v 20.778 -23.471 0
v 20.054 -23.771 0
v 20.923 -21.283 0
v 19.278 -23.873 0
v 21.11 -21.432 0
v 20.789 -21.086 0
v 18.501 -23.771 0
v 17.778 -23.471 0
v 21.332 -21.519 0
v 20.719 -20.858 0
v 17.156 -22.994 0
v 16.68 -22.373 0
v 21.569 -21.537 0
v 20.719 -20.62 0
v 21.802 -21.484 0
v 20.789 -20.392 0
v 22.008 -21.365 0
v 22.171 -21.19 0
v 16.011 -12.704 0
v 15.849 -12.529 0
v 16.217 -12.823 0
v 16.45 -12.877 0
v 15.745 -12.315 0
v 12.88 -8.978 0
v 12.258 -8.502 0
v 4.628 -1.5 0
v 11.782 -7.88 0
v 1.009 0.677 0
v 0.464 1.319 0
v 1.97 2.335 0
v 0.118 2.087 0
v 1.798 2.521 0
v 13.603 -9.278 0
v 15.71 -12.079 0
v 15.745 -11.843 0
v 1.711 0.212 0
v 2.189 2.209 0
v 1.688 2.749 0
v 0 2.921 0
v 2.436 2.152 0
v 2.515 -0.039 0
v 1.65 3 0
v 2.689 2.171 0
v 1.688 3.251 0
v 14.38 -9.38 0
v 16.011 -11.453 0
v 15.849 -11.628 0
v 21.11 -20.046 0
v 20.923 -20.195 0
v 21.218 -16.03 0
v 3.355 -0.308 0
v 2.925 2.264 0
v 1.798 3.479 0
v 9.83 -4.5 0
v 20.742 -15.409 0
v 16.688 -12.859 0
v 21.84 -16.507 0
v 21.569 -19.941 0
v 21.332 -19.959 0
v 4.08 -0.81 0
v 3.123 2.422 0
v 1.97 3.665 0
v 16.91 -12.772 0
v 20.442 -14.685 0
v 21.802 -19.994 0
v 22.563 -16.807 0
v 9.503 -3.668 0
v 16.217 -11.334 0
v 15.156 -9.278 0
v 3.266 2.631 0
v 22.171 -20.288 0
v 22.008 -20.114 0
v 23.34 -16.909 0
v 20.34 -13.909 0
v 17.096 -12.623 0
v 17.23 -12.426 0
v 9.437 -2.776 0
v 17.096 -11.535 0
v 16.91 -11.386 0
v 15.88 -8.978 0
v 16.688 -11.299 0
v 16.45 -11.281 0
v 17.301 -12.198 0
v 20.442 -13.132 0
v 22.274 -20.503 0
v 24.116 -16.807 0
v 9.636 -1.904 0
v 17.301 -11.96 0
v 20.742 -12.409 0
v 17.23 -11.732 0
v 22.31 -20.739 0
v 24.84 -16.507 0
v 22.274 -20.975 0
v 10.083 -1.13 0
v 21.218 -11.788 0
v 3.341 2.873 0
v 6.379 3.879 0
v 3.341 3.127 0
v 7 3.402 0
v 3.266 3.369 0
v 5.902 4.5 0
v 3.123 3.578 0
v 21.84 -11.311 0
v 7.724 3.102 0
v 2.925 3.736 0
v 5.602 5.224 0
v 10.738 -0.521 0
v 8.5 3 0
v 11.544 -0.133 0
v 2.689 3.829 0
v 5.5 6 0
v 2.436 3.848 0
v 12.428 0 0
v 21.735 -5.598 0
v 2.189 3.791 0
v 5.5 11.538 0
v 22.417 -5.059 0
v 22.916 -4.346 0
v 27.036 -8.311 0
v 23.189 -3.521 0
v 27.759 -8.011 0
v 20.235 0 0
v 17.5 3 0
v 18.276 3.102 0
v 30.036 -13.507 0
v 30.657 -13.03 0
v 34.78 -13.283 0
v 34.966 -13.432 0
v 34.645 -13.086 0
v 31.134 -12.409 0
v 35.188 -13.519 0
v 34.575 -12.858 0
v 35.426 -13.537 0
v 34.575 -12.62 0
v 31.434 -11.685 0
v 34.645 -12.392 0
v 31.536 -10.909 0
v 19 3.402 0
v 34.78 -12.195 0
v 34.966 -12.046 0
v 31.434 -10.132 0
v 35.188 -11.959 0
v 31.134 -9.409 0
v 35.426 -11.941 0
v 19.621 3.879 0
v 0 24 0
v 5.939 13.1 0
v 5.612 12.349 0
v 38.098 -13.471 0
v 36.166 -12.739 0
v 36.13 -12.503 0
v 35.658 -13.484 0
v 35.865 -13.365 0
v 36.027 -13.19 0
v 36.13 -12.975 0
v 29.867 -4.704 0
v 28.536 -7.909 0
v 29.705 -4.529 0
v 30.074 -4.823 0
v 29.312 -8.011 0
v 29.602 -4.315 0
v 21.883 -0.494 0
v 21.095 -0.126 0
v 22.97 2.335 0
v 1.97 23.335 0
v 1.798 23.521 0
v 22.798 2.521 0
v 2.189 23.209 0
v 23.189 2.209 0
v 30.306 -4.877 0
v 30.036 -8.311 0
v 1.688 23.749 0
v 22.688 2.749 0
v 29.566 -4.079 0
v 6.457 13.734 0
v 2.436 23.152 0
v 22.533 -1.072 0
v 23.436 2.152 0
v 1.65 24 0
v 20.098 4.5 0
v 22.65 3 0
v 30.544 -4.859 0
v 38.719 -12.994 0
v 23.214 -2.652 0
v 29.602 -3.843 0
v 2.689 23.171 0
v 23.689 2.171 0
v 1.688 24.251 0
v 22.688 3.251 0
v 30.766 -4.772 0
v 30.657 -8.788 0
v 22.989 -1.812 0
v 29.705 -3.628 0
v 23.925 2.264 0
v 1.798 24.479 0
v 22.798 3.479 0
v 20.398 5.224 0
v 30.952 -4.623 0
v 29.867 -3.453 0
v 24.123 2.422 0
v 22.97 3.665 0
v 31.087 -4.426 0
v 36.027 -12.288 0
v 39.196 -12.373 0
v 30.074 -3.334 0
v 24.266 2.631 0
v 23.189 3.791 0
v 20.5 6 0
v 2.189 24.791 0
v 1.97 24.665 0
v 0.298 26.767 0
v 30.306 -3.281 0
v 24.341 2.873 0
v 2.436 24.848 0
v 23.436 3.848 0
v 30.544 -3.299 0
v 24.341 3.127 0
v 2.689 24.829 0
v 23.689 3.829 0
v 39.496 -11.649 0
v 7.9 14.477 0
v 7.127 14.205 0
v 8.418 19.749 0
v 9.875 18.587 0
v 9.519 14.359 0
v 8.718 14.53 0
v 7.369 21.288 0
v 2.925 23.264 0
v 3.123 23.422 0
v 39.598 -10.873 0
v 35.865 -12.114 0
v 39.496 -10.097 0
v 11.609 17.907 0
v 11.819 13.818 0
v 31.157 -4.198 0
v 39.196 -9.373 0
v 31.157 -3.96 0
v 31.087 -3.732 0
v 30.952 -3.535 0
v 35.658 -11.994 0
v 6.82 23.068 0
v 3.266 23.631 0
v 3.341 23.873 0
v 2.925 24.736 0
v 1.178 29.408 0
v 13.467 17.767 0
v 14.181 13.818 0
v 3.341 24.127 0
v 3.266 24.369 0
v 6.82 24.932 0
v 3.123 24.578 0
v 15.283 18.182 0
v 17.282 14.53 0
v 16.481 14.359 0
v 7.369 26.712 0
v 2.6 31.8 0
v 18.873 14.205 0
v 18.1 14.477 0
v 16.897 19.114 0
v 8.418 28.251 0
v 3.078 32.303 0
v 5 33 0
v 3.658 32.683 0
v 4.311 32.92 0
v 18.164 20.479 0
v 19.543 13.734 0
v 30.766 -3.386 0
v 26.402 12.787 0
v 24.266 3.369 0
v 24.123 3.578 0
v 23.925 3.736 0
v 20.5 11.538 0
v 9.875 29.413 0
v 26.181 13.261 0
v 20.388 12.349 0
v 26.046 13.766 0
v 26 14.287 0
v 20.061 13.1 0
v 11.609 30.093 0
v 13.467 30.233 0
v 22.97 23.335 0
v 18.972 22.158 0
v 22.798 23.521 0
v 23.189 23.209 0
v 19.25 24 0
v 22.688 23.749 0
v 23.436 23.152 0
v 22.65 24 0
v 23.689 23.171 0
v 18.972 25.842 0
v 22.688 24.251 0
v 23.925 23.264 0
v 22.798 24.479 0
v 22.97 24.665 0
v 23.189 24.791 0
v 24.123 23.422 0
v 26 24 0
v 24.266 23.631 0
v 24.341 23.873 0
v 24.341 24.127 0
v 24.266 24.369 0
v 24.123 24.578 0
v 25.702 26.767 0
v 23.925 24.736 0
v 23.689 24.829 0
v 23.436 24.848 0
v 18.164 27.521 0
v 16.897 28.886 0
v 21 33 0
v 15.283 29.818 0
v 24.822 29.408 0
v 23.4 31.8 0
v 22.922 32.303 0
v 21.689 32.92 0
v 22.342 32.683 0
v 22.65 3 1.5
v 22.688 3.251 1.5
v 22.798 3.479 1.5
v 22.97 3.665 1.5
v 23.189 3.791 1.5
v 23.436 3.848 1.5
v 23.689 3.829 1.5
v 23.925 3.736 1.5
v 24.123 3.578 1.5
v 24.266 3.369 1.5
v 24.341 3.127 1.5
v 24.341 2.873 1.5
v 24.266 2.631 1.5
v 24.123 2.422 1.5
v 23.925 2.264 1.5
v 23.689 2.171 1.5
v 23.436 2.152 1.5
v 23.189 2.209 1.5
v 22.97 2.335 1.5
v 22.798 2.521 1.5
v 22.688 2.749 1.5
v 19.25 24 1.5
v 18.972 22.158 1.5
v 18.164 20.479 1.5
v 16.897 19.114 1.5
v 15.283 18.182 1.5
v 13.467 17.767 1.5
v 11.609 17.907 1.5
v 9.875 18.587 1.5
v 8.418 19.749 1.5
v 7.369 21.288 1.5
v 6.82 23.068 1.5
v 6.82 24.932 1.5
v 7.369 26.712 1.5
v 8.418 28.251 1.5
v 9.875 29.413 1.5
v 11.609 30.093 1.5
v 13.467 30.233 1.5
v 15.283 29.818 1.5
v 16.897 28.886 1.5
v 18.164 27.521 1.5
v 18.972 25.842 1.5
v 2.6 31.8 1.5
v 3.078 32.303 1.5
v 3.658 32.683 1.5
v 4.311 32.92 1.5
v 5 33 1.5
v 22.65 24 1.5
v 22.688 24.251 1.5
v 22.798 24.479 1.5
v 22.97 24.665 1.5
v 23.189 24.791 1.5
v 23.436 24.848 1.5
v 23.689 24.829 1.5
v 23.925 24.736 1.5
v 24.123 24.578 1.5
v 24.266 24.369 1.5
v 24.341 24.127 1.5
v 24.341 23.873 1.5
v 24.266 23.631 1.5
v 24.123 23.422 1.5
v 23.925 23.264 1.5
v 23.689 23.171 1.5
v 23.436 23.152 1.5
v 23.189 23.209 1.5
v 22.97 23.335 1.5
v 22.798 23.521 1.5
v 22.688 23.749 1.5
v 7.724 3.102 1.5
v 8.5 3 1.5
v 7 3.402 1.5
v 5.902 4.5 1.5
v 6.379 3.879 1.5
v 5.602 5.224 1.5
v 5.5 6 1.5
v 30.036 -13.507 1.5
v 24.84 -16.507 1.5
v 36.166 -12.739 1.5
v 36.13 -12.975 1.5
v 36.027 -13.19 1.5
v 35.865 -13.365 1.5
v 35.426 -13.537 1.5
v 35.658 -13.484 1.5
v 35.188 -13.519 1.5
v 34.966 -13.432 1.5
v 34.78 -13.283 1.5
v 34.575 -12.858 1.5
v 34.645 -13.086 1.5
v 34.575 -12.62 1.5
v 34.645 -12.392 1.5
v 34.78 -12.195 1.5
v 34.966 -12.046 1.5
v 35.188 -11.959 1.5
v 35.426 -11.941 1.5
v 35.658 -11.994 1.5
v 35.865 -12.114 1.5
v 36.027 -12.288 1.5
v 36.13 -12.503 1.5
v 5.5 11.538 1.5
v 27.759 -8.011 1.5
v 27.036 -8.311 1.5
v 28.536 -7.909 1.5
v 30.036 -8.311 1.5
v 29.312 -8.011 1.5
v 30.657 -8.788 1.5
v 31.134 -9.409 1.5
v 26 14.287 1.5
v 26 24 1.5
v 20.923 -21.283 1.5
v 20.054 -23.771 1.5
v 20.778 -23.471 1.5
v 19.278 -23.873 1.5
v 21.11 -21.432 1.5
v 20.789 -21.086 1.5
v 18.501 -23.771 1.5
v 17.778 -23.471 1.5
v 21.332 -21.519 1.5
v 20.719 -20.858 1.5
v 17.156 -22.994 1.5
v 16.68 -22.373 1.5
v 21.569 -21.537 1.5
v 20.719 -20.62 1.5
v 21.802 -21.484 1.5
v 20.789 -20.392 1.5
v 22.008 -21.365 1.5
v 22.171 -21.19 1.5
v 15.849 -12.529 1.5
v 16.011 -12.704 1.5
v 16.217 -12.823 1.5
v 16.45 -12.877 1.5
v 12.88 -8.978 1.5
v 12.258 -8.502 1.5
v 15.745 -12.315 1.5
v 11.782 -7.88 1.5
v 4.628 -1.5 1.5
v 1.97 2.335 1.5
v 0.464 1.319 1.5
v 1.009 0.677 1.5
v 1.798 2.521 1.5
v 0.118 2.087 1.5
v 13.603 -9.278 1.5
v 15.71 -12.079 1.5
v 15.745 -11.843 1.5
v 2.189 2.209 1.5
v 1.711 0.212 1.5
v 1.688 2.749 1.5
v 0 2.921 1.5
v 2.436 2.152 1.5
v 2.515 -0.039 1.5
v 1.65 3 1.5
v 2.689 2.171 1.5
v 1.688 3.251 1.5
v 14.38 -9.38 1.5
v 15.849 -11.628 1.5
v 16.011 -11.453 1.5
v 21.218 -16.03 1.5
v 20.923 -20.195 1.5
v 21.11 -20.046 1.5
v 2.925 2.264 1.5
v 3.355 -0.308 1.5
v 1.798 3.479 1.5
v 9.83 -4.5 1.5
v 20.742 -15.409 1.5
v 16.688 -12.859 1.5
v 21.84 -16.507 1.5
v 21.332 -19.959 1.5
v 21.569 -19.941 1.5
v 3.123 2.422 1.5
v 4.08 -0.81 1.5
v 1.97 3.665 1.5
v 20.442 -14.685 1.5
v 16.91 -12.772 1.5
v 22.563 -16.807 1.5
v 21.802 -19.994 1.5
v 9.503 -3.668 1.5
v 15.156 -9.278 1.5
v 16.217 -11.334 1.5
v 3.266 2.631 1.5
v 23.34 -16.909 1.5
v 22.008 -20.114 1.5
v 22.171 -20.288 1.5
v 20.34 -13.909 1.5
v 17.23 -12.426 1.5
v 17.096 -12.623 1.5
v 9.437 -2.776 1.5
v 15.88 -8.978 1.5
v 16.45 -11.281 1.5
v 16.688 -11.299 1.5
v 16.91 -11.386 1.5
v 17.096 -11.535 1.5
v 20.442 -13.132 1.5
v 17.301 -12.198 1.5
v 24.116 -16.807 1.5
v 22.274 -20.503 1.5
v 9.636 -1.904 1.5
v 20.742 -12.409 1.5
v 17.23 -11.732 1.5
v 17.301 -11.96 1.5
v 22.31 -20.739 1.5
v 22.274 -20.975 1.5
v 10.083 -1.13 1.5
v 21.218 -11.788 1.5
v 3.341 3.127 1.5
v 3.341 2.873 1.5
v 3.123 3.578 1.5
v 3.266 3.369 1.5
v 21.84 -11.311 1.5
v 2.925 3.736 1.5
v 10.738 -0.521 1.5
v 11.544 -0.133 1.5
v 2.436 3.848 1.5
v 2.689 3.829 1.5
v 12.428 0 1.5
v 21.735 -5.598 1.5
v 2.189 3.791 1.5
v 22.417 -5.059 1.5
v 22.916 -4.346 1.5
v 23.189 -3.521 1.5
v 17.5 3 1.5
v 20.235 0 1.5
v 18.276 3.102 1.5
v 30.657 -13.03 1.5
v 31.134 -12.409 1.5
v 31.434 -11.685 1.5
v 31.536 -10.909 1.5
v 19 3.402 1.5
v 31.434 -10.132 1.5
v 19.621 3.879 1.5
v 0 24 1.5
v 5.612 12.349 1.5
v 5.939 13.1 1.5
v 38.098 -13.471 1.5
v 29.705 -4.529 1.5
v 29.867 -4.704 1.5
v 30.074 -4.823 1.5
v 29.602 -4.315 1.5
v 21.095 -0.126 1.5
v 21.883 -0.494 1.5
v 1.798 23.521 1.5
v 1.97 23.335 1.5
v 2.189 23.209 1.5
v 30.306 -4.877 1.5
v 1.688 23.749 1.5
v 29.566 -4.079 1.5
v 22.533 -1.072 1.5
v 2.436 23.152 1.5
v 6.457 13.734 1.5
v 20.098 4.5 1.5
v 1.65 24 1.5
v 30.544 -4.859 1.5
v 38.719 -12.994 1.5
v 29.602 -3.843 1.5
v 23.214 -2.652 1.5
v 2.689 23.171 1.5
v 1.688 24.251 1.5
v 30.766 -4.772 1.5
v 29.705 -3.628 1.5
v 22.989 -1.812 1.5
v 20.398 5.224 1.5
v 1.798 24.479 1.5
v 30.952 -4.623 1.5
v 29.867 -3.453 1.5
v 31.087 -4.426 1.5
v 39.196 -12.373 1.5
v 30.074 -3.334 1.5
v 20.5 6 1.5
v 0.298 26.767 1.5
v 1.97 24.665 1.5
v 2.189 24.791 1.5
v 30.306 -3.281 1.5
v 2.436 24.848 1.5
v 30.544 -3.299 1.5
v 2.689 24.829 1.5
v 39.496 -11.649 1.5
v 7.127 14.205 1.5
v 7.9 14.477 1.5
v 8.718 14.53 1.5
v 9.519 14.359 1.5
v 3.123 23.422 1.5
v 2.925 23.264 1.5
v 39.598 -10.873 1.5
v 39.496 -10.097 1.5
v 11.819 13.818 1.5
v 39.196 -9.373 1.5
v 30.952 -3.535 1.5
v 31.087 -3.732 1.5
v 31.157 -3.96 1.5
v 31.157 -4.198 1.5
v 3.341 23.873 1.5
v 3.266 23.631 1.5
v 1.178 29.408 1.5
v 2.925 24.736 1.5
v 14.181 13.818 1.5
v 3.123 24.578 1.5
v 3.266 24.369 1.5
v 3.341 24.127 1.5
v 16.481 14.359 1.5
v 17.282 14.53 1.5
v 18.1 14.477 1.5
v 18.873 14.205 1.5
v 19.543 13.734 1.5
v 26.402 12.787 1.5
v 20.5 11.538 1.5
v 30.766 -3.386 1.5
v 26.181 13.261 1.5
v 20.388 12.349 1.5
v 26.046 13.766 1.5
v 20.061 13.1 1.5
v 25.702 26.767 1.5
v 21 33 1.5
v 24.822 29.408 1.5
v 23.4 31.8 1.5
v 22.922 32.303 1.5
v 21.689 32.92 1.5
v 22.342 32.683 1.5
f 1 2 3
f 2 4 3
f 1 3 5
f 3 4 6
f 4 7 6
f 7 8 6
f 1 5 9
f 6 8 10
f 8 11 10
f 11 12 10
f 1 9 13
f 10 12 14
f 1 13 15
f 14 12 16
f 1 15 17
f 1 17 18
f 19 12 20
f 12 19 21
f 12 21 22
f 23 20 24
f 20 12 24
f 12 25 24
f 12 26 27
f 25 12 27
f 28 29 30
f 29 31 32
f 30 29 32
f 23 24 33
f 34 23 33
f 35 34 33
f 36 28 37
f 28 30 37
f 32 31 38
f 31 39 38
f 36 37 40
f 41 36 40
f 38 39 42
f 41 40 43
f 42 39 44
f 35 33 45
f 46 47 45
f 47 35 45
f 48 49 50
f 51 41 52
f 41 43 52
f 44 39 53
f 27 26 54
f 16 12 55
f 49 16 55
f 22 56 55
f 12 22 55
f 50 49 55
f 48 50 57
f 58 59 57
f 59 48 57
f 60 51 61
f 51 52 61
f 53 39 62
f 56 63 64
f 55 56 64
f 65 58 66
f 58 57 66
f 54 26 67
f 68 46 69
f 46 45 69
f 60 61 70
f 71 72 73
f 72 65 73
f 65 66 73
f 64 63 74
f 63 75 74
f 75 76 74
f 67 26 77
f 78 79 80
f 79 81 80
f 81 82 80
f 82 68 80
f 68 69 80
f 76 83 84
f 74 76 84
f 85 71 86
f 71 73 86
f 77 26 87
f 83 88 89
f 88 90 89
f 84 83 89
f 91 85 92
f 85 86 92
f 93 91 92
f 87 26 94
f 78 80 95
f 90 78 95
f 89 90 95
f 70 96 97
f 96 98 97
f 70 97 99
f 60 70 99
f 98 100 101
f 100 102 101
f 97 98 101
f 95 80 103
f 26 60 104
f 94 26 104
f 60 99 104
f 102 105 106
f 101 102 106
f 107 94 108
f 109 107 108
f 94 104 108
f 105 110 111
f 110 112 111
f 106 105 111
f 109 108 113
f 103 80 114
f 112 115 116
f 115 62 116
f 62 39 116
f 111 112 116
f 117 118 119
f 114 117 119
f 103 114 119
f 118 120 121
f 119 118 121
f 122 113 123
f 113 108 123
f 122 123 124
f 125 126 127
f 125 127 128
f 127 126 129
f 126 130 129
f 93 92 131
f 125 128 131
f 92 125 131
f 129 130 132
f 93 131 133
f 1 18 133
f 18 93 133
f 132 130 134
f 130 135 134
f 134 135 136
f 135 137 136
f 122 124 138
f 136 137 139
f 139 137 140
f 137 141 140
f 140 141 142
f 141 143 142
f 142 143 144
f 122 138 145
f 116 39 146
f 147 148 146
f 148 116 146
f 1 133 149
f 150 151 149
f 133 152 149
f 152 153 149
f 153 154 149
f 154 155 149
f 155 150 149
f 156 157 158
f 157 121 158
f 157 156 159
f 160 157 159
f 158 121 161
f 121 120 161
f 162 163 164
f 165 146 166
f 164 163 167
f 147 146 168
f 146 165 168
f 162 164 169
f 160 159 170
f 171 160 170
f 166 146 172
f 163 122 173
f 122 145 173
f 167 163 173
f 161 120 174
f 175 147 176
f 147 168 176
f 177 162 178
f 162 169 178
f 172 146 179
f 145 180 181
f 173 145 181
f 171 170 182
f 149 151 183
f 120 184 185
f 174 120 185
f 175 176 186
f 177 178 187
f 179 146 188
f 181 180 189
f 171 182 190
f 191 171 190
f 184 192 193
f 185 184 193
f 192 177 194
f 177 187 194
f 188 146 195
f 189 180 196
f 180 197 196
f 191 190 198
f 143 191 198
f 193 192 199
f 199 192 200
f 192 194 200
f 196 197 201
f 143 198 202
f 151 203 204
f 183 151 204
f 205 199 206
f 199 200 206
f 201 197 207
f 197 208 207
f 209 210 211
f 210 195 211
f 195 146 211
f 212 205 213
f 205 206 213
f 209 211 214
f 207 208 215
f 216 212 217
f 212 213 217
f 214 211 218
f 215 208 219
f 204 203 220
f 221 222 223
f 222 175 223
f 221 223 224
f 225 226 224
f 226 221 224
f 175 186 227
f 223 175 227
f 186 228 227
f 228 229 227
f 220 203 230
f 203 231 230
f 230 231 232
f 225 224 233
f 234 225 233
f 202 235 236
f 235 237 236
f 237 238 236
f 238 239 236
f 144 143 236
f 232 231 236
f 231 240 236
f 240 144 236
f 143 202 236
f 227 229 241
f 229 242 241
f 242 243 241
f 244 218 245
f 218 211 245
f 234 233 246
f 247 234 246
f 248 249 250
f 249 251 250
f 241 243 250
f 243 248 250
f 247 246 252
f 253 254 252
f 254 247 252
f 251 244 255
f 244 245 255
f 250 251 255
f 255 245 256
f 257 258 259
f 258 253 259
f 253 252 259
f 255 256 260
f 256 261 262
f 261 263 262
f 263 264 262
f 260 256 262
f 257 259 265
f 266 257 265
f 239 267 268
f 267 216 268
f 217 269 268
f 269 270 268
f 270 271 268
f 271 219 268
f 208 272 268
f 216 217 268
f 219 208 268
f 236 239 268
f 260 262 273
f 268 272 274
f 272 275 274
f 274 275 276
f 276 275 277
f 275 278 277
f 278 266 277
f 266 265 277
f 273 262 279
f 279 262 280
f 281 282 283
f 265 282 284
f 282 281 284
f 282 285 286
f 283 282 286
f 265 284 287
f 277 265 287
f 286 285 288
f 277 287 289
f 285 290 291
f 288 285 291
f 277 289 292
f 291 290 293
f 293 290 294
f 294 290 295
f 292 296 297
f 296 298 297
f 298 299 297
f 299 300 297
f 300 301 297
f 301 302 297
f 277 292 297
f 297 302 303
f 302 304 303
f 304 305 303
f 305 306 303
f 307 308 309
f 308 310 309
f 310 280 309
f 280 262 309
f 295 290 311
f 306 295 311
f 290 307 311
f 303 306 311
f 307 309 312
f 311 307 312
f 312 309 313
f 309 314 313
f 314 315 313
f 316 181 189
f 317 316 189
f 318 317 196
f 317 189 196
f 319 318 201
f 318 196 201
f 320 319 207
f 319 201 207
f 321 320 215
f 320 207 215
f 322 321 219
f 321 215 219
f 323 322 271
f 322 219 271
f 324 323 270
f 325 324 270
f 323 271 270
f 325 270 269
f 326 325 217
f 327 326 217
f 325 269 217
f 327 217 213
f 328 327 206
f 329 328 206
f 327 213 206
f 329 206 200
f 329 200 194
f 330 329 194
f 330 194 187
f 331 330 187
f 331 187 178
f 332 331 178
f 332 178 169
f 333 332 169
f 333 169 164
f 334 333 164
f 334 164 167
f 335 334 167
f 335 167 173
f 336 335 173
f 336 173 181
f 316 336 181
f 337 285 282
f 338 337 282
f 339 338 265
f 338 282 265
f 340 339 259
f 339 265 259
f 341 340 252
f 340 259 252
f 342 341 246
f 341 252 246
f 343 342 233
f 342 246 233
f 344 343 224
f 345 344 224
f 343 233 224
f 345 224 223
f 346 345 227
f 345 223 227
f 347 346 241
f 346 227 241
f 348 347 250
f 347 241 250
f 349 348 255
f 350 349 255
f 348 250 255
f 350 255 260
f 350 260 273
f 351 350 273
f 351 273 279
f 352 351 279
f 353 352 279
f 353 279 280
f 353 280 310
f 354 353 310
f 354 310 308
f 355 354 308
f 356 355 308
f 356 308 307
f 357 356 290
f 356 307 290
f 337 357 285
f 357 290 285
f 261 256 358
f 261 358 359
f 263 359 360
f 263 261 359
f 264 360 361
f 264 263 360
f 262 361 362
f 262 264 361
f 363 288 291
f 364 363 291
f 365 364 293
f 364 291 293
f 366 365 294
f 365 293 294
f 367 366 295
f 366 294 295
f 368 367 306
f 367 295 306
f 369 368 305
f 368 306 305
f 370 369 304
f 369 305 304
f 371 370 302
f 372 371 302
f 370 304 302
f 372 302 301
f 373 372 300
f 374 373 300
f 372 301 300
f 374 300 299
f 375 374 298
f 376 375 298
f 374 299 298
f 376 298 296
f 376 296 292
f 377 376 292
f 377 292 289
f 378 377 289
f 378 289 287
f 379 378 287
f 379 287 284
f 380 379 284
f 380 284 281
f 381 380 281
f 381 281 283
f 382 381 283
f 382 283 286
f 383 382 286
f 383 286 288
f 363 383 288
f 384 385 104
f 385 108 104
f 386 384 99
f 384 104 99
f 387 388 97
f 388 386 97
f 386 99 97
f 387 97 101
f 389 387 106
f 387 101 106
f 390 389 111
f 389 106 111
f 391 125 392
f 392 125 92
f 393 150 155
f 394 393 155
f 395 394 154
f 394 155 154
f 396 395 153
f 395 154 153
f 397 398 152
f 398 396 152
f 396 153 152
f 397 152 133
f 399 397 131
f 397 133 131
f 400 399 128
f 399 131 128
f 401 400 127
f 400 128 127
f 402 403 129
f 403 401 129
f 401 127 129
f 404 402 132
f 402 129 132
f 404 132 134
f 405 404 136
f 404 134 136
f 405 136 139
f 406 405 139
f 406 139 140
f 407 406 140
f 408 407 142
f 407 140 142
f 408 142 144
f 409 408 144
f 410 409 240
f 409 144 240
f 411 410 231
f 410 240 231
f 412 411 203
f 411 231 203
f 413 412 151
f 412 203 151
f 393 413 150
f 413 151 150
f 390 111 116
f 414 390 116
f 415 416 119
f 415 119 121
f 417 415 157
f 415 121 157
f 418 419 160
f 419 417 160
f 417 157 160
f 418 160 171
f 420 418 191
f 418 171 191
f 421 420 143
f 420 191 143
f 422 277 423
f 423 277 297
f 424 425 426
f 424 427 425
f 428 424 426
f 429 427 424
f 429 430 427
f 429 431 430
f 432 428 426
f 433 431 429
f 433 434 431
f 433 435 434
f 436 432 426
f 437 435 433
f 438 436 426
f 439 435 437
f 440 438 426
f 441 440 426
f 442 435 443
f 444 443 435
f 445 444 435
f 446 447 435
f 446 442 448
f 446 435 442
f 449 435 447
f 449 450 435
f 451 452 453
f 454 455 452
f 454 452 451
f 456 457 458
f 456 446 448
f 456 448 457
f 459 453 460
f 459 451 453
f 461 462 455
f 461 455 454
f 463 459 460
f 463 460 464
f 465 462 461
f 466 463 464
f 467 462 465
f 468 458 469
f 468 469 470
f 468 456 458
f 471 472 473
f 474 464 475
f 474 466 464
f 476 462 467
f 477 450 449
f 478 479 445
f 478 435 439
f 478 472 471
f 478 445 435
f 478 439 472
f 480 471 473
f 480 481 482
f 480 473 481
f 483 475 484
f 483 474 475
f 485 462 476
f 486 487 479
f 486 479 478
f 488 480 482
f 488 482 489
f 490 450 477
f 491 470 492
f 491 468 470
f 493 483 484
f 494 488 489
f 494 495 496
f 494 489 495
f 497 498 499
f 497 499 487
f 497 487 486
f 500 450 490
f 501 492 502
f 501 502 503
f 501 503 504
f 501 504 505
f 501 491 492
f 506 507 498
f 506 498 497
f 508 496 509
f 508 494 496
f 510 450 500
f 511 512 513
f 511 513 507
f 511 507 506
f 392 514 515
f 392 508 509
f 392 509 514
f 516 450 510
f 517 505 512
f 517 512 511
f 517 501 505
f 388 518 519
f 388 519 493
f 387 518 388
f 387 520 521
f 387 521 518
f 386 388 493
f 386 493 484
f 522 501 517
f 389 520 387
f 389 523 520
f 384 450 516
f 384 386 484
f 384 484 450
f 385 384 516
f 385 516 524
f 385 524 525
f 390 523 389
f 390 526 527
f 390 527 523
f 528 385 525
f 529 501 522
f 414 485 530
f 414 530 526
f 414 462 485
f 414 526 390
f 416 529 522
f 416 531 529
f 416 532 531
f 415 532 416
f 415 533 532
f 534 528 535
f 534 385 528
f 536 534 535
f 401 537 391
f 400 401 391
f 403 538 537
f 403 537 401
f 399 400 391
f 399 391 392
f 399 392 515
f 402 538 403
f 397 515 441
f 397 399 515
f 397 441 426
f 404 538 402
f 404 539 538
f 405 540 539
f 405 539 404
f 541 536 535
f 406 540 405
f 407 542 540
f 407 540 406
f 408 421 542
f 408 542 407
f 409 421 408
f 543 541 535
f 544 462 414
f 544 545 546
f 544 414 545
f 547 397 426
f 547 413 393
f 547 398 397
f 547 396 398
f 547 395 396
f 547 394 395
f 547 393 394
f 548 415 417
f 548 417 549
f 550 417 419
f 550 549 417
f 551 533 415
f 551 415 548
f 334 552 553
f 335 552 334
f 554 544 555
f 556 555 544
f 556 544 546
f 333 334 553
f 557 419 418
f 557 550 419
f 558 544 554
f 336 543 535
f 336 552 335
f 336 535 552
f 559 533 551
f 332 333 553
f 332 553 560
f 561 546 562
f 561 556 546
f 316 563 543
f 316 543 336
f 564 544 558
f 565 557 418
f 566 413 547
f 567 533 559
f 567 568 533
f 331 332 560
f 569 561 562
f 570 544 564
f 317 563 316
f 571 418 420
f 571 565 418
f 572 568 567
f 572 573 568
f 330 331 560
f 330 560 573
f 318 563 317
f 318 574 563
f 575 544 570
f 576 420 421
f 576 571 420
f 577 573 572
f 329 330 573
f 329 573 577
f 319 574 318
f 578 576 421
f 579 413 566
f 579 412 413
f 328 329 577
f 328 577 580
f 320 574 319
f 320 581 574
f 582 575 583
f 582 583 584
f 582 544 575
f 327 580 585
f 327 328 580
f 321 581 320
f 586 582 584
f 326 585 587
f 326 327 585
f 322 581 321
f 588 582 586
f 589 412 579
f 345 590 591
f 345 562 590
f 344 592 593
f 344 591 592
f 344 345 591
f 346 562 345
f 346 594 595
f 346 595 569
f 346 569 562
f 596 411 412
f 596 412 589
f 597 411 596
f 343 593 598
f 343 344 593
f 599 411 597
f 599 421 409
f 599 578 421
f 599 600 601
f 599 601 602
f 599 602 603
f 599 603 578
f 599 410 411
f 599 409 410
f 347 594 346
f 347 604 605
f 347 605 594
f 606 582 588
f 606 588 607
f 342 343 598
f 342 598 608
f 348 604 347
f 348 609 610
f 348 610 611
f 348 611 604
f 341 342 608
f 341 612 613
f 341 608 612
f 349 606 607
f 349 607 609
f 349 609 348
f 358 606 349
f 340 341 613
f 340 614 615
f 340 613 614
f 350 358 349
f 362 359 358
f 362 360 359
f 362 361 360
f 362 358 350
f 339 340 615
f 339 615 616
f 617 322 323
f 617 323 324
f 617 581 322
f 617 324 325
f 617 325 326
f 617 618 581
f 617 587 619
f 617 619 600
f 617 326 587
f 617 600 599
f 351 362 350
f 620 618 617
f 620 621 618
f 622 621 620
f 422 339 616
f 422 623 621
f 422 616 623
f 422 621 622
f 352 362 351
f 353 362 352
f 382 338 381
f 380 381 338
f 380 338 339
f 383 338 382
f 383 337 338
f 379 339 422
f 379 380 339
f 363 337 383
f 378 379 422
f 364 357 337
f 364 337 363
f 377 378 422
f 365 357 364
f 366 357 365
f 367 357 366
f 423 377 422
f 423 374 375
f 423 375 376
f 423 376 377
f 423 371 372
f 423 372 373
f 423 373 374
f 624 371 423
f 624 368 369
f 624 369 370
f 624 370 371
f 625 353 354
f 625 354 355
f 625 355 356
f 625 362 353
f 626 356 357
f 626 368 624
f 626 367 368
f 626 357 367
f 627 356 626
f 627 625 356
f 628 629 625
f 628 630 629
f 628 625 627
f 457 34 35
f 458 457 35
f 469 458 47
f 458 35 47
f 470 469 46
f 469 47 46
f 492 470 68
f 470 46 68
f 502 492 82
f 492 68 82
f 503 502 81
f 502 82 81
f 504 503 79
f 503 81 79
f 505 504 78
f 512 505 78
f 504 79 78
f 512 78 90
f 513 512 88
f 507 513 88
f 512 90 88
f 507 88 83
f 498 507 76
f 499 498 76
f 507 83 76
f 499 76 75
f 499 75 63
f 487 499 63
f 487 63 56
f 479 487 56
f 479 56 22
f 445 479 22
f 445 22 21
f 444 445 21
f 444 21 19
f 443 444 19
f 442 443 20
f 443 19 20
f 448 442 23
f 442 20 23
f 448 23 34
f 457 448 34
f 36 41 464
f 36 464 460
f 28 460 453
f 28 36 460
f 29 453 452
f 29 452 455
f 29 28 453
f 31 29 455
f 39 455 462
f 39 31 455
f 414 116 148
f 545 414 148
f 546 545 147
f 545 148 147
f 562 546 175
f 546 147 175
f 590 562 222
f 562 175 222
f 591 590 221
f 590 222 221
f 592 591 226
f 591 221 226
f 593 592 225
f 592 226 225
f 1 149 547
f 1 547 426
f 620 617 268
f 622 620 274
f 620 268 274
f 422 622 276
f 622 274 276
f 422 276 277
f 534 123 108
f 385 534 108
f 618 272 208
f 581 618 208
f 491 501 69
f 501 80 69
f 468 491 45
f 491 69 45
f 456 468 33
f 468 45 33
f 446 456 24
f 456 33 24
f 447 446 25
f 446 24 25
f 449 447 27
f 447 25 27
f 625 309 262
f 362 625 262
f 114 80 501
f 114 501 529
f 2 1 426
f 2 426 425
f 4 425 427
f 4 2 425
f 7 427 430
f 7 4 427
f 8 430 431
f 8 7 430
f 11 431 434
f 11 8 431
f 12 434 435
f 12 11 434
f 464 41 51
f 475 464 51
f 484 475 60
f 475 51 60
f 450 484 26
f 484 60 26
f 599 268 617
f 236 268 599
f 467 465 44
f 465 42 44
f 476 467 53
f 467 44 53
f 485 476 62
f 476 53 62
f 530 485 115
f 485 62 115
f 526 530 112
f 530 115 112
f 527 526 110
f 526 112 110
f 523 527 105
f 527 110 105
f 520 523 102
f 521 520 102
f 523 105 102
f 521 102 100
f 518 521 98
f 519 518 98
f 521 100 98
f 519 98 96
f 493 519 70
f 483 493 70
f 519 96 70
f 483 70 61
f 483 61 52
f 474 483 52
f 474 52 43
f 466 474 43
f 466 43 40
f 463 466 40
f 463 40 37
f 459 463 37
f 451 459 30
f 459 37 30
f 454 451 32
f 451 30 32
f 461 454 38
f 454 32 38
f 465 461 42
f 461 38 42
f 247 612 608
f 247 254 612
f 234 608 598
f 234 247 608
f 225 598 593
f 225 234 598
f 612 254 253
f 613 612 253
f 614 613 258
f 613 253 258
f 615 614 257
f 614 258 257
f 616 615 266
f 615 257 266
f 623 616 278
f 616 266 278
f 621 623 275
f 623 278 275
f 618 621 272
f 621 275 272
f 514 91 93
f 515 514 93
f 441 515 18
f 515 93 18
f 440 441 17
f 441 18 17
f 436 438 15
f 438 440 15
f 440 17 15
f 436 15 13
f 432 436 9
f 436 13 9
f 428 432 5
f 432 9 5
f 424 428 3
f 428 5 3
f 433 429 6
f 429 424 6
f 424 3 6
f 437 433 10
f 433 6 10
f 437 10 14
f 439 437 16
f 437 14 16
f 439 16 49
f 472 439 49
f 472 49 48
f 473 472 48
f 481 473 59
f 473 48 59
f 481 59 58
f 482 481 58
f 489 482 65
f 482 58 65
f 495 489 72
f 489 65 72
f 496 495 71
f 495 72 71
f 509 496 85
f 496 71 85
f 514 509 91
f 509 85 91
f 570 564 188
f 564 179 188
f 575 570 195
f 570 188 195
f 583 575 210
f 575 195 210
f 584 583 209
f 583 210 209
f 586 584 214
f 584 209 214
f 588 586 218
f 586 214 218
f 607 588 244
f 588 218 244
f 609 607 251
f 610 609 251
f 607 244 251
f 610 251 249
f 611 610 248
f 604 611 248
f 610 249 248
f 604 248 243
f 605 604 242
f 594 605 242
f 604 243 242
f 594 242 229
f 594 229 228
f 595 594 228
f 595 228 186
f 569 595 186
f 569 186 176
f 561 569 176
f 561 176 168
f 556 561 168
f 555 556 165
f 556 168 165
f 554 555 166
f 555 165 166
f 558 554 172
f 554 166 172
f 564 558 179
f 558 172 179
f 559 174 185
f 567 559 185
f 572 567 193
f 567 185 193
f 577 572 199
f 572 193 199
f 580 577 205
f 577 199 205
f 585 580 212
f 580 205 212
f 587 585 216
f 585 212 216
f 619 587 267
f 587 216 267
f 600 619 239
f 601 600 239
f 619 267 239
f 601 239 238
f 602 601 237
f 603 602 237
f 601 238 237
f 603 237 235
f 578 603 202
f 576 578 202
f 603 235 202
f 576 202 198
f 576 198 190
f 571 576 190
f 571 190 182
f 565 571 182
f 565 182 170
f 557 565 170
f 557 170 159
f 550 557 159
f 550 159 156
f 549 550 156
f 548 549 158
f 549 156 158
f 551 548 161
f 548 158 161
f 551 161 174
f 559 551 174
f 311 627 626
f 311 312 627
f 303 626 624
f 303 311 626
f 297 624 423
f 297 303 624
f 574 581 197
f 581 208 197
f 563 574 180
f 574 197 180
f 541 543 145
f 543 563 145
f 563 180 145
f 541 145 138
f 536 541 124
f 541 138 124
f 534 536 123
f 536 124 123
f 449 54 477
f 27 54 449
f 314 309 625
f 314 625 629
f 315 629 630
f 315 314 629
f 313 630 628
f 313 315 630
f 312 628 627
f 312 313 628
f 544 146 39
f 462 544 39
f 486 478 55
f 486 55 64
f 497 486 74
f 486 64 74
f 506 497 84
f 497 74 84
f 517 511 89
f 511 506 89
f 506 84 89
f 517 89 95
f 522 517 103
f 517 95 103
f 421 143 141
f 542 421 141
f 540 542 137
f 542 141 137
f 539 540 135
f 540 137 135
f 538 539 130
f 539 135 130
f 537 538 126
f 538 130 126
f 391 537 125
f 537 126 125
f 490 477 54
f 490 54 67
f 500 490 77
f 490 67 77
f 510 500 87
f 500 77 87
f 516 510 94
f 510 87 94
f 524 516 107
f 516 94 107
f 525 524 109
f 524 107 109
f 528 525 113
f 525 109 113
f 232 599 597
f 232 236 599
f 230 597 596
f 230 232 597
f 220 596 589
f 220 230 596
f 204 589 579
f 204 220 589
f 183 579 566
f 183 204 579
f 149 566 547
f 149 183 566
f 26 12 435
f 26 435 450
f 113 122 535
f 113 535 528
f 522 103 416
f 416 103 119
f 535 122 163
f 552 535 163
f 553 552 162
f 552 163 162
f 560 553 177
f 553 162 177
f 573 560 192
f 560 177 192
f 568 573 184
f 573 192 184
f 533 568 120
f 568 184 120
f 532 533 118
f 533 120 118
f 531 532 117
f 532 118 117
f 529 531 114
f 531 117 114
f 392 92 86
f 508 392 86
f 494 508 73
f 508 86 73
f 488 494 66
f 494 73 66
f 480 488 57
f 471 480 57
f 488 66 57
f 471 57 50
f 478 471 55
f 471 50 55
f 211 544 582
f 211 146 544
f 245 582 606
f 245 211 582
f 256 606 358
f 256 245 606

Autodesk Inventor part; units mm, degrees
ref_plane "YZ Plane" through (0, 0, 0) normal (1, 0, 0) x (0, 1, 0)
ref_plane "XZ Plane" through (0, 0, 0) normal (0, 1, 0) x (-1, 0, 0)
ref_plane "XY Plane" through (0, 0, 0) normal (0, 0, 1) x (1, 0, 0)
sketch "スケッチ2" plane through (0, 0, 0) normal (0, 0, 1) x (1, 0, 0)
  line L0 (0, 0) -> (26, 0)
  line L1 (26, 0) -> (26, 33)
  line L2 (26, 33) -> (0, 33)
  line L3 (0, 33) -> (0, 0)
  line L4 (0, 0) -> (26, 0)
  line L5 (26, 0) -> (26, 24)
  line L6 (26, 24) -> (0, 24) construction
  line L7 (0, 24) -> (0, 0)
  circle A0 centre (13, 24) radius 13
  circle A1 centre (13, 24) radius 6.25
  line L8 (26, 0) -> (0, 0)
  line L9 (17.9352, 27.452) -> (40.6962, -11.9711)
  line L10 (40.6962, -11.9711) -> (18.1795, -24.9711)
  line L11 (18.1795, -24.9711) -> (-4.3205, 14)
  circle A2 centre (21.5096, -20.7391) radius 0.8
  circle A3 centre (35.366, -12.7391) radius 0.8
  line L12 (-4.3205, 14) -> (18.1962, 27)
  point P0 (22.3808, 33)
  point P1 (3.6192, 33)
  point P2 (26, 13.4833)
  point P3 (3.7624, 0)
  point P4 (23.9624, 17.0125)
  point P5 (1.7417, 17.5)
  point P6 (0, 16.4944)
  point P7 (0, 6.5167)
  point P8 (7.5873, 20.875)
  point P9 (19.0712, 25.4845)
  dimension "d0" = 26
  dimension "d1" = 33
  dimension "d2" = 24
  dimension "d3" = 12.5
  dimension "d14" = 26
  dimension "d17" = 1.6
  dimension "d18" = 1.6
  dimension "d19" = 2
  dimension "d20" = 2
  dimension "d21" = 5
  dimension "d22" = 5
  dimension "d23" = 20
  dimension "d25" = 45
  dimension "d26" = 30
extrude "押し出し1" add sketch "スケッチ2" along normal blind 1.5 contours L3 L11 L0 | L11 L3 L12 A0 L9 L1 L0 | L0 L1 L9 L10 L11 | L3 A0 L12 | L9 A0 L1 | A0 L2 L9 A1 L12 | L12 A1 L9 A0
sketch "スケッチ3" plane through (0, 0, 0) normal (0, 0, -1) x (-1, 0, 0)
  circle A0 centre (-2.5, 24) radius 0.85 projected
  circle A1 centre (-23.5, 24) radius 0.85 projected
  circle A2 centre (-23.5, 3) radius 0.85 projected
  circle A3 centre (-2.5, 3) radius 0.85 projected
  circle A4 centre (-30.366, -4.0788) radius 0.8 projected
  circle A5 centre (-16.5096, -12.0788) radius 0.8 projected
  circle A6 centre (-13, 24) radius 6.25 projected
  line L0 (-2.5, 24) -> (-23.5, 24)
  line L1 (-23.5, 24) -> (-23.5, 3)
  line L2 (-23.5, 3) -> (-2.5, 3)
  line L3 (-2.5, 3) -> (-2.5, 24)
  circle A7 centre (-13, 24) radius 10.25
  line L4 (-5.5, 24) -> (-20.5, 24)
  line L5 (-20.5, 24) -> (-20.5, 3)
  line L6 (-20.5, 3) -> (-5.5, 3)
  line L7 (-5.5, 3) -> (-5.5, 24)
  line L8 (-3.7624, 0) -> (-18.1795, -24.9711) projected
  line L9 (0, 24) -> (0, 0) projected
  arc A8 (0, 24) -> (-3.6192, 33) centre (-13, 24) ccw projected
  line L10 (-22.3808, 33) -> (-3.6192, 33) projected
  arc A9 (-22.3808, 33) -> (-26, 24) centre (-13, 24) ccw projected
  line L11 (-26, 13.4833) -> (-26, 24) projected
  line L12 (-40.6962, -11.9711) -> (-26, 13.4833) projected
  line L13 (-18.1795, -24.9711) -> (-40.6962, -11.9711) projected
  line L14 (-3.7624, 0) -> (-18.1795, -24.9711) projected
  line L15 (0, 0) -> (-3.7624, 0) projected
  circle A10 centre (-13, 24) radius 6.25 projected
  circle A11 centre (-21.5096, -20.7391) radius 0.8 projected
  circle A12 centre (-35.366, -12.7391) radius 0.8 projected
  line L16 (-21.5096, -20.7391) -> (-16.5096, -12.0788)
  line L17 (-16.5096, -12.0788) -> (-30.366, -4.0788)
  line L18 (-30.366, -4.0788) -> (-35.366, -12.7391)
  line L19 (-35.366, -12.7391) -> (-21.5096, -20.7391)
  line L20 (-22.2417, -18.007) -> (-19.2417, -12.8109)
  line L21 (-19.2417, -12.8109) -> (-29.634, -6.8109)
  line L22 (-29.634, -6.8109) -> (-32.634, -12.007)
  line L23 (-32.634, -12.007) -> (-22.2417, -18.007)
  line L24 (-13.2817, -10.4784) -> (-24.5317, -3.9832)
  line L25 (-24.5317, -3.9832) -> (-16.75, 9.4952)
  line L26 (-16.75, 9.4952) -> (-5.5, 3)
  line L27 (-5.5, 3) -> (-13.2817, -10.4784)
  line L28 (-24.5317, -3.9832) -> (-28.866, -1.4808)
  line L29 (-28.866, -1.4808) -> (-28.0111, 0)
  line L30 (-28.0111, 0) -> (-22.2321, 0)
  line L31 (-22.2321, 0) -> (-7.2321, 0)
  point P0 (-5.5, 17.0134)
  point P1 (-20.5, 17.0134)
  dimension "d27" = 4
  dimension "d28" = 3
  dimension "d29" = 3
  dimension "d31" = 2
  dimension "d32" = 2
  dimension "d33" = 2
  dimension "d34" = 2
  dimension "d35" = 3
  dimension "d36" = 3
extrude "押し出し2" cut sketch "スケッチ3" against normal through all contours A0 L3 L0 A7 | A7 L0 A0 | A0 A7 L0 L3 | L0 A7 A0 | L3 L2 A3 | A3 L2 L3 | L7 L26 L25 L5 A7 | A7 L0 L1 A1 | A1 L0 A7 | L2 L25 L26 | A1 A7 L0 | L1 L0 A7 A1 | L27 L24 L25 L31 | L1 L2 A2 | A2 L2 L1 | L25 L28 L29 L30 | A4 L17 L18 | L18 L17 A4 | L17 L16 A5 | A5 L16 L17 | L23 L22 L21 L20
fillet "フィレット1" radius 3 19 edges at (20.5, 3, 0.75) (5.5, 3, 0.75) (20.5, 17.0134, 0.75) (5.5, 17.0134, 0.75) (7.2321, 0, 0.75) (13.2817, -10.4784, 0.75) (28.0111, 0, 0.75) (28.866, -1.4808, 0.75) (29.634, -6.8109, 0.75) (32.634, -12.007, 0.75) (22.2417, -18.007, 0.75) (19.2417, -12.8109, 0.75) (40.6962, -11.9711, 0.75) (18.1795, -24.9711, 0.75) (3.7624, 0, 0.75) (0, 0, 0.75) (26, 13.4833, 0.75) (22.3808, 33, 0.75) (3.6192, 33, 0.75)
equation "\"d20\" = d19"
properties part number "elbow" material "アルミニウム 6061"
